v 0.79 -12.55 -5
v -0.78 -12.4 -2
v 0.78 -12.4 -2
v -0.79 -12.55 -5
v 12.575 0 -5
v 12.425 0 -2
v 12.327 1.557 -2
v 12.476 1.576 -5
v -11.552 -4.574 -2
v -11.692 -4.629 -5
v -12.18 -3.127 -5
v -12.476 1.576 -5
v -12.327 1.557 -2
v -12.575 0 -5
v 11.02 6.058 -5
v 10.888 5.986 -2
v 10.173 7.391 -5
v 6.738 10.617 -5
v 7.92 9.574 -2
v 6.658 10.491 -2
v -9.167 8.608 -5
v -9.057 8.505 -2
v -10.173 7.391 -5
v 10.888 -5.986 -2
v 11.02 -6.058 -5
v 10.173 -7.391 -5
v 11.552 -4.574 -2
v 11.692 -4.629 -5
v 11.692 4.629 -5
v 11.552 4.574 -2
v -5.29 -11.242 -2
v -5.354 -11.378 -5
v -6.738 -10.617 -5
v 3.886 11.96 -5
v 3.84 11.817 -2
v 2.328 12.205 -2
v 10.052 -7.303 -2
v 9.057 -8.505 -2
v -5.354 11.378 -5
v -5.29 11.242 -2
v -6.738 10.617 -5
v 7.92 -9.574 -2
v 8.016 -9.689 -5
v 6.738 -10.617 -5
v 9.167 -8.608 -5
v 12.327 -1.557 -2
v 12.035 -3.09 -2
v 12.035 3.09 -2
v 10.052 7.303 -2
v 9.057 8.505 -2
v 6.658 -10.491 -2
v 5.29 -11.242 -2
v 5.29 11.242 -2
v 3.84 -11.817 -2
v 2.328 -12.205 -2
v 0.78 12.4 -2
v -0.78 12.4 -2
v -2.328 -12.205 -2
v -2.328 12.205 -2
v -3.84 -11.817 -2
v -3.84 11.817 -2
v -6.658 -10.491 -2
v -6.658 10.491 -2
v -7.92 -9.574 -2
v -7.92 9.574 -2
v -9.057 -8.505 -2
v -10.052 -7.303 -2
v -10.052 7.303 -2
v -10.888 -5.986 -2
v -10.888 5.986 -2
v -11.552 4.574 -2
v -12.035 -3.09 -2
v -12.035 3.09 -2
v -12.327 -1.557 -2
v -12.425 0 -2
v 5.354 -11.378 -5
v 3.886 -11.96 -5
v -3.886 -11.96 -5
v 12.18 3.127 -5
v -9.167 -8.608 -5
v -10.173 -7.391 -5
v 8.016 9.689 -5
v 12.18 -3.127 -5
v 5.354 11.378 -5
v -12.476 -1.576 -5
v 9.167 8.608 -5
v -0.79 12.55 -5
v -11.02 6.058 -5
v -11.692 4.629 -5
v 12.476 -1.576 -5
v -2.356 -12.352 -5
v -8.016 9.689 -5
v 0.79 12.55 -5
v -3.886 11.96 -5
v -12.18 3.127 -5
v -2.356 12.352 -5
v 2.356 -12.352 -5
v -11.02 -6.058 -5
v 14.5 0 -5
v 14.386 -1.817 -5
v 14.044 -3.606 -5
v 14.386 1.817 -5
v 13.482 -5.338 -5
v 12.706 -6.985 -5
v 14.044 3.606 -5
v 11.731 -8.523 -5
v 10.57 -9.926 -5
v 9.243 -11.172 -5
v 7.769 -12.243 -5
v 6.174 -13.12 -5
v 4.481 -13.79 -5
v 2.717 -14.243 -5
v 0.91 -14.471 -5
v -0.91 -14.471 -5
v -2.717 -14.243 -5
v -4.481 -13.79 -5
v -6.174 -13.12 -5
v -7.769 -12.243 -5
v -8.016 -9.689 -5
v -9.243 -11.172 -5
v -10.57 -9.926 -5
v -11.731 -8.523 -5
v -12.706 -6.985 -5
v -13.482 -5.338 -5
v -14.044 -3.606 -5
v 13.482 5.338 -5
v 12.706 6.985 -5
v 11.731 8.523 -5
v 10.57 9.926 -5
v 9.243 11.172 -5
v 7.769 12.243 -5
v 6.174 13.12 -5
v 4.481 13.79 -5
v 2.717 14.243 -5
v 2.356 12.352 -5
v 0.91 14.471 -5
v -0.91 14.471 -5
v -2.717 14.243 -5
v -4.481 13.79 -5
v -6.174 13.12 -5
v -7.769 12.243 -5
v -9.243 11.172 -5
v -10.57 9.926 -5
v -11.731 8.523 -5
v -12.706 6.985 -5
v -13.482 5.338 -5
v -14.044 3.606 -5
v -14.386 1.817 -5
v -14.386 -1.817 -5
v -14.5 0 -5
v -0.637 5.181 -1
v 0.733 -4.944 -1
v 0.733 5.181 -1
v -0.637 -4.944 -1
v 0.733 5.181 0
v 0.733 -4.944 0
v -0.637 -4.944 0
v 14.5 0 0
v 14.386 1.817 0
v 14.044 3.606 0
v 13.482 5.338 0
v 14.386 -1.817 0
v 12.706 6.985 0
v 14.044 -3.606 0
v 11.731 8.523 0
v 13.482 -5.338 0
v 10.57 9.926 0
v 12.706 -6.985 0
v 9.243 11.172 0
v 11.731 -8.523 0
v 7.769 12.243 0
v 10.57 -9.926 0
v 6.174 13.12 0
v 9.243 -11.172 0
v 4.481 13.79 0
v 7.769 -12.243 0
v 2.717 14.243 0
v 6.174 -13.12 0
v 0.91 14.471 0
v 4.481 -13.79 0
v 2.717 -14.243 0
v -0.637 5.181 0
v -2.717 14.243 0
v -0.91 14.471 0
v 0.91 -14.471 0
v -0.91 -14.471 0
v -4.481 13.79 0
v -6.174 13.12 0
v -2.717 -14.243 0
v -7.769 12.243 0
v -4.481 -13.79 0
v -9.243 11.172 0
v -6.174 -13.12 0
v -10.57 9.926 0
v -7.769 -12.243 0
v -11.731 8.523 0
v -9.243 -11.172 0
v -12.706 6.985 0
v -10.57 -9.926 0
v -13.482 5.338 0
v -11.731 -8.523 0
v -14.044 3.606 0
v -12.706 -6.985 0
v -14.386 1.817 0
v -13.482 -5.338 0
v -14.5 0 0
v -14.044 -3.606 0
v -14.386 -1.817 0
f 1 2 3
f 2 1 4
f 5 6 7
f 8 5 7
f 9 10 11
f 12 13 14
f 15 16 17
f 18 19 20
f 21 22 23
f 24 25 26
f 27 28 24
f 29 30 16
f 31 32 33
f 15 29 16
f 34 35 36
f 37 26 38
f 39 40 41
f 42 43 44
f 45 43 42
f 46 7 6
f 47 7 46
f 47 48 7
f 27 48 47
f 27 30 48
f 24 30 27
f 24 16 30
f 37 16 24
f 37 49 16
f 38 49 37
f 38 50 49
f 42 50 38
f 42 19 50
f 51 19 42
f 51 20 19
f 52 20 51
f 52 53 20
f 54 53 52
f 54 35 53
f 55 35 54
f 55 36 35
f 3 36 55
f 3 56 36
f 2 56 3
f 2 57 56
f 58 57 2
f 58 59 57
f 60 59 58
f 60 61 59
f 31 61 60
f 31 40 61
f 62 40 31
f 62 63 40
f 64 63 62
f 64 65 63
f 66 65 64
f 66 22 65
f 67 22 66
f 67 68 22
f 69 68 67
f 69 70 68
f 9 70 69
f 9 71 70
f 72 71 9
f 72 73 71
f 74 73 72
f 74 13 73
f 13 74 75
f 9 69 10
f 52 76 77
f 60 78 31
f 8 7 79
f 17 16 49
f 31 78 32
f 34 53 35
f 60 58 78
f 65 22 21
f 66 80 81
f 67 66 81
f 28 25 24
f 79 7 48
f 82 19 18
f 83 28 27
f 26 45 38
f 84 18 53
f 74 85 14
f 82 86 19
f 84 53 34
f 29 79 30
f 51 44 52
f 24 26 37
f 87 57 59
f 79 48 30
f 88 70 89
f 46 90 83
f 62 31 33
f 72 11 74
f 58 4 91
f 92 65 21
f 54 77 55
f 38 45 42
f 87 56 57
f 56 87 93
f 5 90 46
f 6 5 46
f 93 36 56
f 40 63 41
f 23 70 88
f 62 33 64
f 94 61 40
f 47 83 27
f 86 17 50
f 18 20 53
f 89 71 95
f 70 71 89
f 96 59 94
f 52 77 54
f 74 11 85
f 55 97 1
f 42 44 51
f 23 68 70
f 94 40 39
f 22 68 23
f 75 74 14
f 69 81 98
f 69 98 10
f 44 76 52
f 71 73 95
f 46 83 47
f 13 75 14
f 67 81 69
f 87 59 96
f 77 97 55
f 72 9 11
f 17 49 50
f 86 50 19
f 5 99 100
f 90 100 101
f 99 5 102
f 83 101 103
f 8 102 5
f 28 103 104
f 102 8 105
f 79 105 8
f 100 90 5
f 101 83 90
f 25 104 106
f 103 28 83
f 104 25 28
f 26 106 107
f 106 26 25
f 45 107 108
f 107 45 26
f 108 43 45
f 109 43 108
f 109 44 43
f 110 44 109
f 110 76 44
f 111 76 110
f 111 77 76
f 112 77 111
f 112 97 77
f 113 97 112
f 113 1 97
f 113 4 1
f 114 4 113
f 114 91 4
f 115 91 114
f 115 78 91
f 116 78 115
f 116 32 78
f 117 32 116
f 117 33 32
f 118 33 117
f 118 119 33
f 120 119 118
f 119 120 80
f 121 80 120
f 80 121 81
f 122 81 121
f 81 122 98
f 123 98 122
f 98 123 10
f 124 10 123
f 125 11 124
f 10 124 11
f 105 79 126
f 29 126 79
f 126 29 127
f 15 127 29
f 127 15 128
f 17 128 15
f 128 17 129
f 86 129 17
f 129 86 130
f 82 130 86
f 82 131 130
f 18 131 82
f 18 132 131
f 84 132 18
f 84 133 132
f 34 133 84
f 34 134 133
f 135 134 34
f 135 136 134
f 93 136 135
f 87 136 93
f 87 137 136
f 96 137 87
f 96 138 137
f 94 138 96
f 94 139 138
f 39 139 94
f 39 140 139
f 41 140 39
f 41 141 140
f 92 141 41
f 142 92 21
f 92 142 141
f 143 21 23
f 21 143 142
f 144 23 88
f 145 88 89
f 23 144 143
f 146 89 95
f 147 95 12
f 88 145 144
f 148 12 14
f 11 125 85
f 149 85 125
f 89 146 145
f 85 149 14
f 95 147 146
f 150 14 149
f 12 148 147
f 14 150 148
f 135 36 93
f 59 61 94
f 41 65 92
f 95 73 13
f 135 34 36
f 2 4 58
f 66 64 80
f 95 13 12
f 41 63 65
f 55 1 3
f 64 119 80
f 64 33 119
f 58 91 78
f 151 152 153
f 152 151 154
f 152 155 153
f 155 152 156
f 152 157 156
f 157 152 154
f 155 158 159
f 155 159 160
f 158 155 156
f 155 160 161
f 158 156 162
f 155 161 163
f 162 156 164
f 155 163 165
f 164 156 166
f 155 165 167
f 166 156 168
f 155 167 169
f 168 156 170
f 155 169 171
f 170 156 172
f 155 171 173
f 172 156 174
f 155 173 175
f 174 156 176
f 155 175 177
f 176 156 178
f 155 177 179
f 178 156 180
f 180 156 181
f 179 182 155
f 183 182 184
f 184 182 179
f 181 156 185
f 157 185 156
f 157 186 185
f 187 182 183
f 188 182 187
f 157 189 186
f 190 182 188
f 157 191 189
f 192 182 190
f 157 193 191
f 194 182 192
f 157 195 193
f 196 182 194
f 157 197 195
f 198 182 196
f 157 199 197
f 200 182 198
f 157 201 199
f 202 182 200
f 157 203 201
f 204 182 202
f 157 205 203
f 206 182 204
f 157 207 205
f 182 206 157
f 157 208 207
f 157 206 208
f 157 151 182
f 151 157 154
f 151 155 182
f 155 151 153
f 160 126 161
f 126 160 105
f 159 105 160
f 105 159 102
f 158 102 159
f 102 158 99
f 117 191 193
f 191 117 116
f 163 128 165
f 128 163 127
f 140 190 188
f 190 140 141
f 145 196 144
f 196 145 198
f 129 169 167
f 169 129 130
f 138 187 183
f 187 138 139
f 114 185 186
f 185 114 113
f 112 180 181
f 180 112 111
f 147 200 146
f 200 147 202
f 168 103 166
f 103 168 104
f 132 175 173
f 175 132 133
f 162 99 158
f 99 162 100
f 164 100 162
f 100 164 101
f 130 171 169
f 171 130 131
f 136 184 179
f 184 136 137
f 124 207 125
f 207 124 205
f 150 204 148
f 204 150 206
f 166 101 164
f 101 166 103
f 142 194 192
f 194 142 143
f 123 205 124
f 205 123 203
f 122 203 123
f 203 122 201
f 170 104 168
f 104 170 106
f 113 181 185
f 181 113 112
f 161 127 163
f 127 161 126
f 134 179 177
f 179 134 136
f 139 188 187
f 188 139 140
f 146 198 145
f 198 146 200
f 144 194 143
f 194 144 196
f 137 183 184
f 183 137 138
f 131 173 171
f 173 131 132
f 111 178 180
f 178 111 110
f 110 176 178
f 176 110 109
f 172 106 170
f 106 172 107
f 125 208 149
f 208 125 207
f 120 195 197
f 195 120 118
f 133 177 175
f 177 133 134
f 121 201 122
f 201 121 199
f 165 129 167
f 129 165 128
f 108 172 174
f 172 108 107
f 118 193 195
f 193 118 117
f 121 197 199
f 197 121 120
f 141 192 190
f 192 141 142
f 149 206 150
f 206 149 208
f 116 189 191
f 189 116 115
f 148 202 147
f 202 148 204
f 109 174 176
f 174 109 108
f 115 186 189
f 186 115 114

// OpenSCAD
$fn = 50;


difference() {
	union() {
		translate(v = [0, 0, -5.0000000000]) {
			cylinder(h = 5, r = 14.5000000000);
		}
	}
	union() {
		#translate(v = [0, 0, -5.0000000000]) {
			cylinder(h = 3, r1 = 12.5750000000, r2 = 12.4250000000);
		}
		translate(v = [0, 0, -1]) {
			linear_extrude(height = 1) {
				text(font = "Impact", halign = "center", size = 10, text = "I", valign = "center");
			}
		}
	}
}
